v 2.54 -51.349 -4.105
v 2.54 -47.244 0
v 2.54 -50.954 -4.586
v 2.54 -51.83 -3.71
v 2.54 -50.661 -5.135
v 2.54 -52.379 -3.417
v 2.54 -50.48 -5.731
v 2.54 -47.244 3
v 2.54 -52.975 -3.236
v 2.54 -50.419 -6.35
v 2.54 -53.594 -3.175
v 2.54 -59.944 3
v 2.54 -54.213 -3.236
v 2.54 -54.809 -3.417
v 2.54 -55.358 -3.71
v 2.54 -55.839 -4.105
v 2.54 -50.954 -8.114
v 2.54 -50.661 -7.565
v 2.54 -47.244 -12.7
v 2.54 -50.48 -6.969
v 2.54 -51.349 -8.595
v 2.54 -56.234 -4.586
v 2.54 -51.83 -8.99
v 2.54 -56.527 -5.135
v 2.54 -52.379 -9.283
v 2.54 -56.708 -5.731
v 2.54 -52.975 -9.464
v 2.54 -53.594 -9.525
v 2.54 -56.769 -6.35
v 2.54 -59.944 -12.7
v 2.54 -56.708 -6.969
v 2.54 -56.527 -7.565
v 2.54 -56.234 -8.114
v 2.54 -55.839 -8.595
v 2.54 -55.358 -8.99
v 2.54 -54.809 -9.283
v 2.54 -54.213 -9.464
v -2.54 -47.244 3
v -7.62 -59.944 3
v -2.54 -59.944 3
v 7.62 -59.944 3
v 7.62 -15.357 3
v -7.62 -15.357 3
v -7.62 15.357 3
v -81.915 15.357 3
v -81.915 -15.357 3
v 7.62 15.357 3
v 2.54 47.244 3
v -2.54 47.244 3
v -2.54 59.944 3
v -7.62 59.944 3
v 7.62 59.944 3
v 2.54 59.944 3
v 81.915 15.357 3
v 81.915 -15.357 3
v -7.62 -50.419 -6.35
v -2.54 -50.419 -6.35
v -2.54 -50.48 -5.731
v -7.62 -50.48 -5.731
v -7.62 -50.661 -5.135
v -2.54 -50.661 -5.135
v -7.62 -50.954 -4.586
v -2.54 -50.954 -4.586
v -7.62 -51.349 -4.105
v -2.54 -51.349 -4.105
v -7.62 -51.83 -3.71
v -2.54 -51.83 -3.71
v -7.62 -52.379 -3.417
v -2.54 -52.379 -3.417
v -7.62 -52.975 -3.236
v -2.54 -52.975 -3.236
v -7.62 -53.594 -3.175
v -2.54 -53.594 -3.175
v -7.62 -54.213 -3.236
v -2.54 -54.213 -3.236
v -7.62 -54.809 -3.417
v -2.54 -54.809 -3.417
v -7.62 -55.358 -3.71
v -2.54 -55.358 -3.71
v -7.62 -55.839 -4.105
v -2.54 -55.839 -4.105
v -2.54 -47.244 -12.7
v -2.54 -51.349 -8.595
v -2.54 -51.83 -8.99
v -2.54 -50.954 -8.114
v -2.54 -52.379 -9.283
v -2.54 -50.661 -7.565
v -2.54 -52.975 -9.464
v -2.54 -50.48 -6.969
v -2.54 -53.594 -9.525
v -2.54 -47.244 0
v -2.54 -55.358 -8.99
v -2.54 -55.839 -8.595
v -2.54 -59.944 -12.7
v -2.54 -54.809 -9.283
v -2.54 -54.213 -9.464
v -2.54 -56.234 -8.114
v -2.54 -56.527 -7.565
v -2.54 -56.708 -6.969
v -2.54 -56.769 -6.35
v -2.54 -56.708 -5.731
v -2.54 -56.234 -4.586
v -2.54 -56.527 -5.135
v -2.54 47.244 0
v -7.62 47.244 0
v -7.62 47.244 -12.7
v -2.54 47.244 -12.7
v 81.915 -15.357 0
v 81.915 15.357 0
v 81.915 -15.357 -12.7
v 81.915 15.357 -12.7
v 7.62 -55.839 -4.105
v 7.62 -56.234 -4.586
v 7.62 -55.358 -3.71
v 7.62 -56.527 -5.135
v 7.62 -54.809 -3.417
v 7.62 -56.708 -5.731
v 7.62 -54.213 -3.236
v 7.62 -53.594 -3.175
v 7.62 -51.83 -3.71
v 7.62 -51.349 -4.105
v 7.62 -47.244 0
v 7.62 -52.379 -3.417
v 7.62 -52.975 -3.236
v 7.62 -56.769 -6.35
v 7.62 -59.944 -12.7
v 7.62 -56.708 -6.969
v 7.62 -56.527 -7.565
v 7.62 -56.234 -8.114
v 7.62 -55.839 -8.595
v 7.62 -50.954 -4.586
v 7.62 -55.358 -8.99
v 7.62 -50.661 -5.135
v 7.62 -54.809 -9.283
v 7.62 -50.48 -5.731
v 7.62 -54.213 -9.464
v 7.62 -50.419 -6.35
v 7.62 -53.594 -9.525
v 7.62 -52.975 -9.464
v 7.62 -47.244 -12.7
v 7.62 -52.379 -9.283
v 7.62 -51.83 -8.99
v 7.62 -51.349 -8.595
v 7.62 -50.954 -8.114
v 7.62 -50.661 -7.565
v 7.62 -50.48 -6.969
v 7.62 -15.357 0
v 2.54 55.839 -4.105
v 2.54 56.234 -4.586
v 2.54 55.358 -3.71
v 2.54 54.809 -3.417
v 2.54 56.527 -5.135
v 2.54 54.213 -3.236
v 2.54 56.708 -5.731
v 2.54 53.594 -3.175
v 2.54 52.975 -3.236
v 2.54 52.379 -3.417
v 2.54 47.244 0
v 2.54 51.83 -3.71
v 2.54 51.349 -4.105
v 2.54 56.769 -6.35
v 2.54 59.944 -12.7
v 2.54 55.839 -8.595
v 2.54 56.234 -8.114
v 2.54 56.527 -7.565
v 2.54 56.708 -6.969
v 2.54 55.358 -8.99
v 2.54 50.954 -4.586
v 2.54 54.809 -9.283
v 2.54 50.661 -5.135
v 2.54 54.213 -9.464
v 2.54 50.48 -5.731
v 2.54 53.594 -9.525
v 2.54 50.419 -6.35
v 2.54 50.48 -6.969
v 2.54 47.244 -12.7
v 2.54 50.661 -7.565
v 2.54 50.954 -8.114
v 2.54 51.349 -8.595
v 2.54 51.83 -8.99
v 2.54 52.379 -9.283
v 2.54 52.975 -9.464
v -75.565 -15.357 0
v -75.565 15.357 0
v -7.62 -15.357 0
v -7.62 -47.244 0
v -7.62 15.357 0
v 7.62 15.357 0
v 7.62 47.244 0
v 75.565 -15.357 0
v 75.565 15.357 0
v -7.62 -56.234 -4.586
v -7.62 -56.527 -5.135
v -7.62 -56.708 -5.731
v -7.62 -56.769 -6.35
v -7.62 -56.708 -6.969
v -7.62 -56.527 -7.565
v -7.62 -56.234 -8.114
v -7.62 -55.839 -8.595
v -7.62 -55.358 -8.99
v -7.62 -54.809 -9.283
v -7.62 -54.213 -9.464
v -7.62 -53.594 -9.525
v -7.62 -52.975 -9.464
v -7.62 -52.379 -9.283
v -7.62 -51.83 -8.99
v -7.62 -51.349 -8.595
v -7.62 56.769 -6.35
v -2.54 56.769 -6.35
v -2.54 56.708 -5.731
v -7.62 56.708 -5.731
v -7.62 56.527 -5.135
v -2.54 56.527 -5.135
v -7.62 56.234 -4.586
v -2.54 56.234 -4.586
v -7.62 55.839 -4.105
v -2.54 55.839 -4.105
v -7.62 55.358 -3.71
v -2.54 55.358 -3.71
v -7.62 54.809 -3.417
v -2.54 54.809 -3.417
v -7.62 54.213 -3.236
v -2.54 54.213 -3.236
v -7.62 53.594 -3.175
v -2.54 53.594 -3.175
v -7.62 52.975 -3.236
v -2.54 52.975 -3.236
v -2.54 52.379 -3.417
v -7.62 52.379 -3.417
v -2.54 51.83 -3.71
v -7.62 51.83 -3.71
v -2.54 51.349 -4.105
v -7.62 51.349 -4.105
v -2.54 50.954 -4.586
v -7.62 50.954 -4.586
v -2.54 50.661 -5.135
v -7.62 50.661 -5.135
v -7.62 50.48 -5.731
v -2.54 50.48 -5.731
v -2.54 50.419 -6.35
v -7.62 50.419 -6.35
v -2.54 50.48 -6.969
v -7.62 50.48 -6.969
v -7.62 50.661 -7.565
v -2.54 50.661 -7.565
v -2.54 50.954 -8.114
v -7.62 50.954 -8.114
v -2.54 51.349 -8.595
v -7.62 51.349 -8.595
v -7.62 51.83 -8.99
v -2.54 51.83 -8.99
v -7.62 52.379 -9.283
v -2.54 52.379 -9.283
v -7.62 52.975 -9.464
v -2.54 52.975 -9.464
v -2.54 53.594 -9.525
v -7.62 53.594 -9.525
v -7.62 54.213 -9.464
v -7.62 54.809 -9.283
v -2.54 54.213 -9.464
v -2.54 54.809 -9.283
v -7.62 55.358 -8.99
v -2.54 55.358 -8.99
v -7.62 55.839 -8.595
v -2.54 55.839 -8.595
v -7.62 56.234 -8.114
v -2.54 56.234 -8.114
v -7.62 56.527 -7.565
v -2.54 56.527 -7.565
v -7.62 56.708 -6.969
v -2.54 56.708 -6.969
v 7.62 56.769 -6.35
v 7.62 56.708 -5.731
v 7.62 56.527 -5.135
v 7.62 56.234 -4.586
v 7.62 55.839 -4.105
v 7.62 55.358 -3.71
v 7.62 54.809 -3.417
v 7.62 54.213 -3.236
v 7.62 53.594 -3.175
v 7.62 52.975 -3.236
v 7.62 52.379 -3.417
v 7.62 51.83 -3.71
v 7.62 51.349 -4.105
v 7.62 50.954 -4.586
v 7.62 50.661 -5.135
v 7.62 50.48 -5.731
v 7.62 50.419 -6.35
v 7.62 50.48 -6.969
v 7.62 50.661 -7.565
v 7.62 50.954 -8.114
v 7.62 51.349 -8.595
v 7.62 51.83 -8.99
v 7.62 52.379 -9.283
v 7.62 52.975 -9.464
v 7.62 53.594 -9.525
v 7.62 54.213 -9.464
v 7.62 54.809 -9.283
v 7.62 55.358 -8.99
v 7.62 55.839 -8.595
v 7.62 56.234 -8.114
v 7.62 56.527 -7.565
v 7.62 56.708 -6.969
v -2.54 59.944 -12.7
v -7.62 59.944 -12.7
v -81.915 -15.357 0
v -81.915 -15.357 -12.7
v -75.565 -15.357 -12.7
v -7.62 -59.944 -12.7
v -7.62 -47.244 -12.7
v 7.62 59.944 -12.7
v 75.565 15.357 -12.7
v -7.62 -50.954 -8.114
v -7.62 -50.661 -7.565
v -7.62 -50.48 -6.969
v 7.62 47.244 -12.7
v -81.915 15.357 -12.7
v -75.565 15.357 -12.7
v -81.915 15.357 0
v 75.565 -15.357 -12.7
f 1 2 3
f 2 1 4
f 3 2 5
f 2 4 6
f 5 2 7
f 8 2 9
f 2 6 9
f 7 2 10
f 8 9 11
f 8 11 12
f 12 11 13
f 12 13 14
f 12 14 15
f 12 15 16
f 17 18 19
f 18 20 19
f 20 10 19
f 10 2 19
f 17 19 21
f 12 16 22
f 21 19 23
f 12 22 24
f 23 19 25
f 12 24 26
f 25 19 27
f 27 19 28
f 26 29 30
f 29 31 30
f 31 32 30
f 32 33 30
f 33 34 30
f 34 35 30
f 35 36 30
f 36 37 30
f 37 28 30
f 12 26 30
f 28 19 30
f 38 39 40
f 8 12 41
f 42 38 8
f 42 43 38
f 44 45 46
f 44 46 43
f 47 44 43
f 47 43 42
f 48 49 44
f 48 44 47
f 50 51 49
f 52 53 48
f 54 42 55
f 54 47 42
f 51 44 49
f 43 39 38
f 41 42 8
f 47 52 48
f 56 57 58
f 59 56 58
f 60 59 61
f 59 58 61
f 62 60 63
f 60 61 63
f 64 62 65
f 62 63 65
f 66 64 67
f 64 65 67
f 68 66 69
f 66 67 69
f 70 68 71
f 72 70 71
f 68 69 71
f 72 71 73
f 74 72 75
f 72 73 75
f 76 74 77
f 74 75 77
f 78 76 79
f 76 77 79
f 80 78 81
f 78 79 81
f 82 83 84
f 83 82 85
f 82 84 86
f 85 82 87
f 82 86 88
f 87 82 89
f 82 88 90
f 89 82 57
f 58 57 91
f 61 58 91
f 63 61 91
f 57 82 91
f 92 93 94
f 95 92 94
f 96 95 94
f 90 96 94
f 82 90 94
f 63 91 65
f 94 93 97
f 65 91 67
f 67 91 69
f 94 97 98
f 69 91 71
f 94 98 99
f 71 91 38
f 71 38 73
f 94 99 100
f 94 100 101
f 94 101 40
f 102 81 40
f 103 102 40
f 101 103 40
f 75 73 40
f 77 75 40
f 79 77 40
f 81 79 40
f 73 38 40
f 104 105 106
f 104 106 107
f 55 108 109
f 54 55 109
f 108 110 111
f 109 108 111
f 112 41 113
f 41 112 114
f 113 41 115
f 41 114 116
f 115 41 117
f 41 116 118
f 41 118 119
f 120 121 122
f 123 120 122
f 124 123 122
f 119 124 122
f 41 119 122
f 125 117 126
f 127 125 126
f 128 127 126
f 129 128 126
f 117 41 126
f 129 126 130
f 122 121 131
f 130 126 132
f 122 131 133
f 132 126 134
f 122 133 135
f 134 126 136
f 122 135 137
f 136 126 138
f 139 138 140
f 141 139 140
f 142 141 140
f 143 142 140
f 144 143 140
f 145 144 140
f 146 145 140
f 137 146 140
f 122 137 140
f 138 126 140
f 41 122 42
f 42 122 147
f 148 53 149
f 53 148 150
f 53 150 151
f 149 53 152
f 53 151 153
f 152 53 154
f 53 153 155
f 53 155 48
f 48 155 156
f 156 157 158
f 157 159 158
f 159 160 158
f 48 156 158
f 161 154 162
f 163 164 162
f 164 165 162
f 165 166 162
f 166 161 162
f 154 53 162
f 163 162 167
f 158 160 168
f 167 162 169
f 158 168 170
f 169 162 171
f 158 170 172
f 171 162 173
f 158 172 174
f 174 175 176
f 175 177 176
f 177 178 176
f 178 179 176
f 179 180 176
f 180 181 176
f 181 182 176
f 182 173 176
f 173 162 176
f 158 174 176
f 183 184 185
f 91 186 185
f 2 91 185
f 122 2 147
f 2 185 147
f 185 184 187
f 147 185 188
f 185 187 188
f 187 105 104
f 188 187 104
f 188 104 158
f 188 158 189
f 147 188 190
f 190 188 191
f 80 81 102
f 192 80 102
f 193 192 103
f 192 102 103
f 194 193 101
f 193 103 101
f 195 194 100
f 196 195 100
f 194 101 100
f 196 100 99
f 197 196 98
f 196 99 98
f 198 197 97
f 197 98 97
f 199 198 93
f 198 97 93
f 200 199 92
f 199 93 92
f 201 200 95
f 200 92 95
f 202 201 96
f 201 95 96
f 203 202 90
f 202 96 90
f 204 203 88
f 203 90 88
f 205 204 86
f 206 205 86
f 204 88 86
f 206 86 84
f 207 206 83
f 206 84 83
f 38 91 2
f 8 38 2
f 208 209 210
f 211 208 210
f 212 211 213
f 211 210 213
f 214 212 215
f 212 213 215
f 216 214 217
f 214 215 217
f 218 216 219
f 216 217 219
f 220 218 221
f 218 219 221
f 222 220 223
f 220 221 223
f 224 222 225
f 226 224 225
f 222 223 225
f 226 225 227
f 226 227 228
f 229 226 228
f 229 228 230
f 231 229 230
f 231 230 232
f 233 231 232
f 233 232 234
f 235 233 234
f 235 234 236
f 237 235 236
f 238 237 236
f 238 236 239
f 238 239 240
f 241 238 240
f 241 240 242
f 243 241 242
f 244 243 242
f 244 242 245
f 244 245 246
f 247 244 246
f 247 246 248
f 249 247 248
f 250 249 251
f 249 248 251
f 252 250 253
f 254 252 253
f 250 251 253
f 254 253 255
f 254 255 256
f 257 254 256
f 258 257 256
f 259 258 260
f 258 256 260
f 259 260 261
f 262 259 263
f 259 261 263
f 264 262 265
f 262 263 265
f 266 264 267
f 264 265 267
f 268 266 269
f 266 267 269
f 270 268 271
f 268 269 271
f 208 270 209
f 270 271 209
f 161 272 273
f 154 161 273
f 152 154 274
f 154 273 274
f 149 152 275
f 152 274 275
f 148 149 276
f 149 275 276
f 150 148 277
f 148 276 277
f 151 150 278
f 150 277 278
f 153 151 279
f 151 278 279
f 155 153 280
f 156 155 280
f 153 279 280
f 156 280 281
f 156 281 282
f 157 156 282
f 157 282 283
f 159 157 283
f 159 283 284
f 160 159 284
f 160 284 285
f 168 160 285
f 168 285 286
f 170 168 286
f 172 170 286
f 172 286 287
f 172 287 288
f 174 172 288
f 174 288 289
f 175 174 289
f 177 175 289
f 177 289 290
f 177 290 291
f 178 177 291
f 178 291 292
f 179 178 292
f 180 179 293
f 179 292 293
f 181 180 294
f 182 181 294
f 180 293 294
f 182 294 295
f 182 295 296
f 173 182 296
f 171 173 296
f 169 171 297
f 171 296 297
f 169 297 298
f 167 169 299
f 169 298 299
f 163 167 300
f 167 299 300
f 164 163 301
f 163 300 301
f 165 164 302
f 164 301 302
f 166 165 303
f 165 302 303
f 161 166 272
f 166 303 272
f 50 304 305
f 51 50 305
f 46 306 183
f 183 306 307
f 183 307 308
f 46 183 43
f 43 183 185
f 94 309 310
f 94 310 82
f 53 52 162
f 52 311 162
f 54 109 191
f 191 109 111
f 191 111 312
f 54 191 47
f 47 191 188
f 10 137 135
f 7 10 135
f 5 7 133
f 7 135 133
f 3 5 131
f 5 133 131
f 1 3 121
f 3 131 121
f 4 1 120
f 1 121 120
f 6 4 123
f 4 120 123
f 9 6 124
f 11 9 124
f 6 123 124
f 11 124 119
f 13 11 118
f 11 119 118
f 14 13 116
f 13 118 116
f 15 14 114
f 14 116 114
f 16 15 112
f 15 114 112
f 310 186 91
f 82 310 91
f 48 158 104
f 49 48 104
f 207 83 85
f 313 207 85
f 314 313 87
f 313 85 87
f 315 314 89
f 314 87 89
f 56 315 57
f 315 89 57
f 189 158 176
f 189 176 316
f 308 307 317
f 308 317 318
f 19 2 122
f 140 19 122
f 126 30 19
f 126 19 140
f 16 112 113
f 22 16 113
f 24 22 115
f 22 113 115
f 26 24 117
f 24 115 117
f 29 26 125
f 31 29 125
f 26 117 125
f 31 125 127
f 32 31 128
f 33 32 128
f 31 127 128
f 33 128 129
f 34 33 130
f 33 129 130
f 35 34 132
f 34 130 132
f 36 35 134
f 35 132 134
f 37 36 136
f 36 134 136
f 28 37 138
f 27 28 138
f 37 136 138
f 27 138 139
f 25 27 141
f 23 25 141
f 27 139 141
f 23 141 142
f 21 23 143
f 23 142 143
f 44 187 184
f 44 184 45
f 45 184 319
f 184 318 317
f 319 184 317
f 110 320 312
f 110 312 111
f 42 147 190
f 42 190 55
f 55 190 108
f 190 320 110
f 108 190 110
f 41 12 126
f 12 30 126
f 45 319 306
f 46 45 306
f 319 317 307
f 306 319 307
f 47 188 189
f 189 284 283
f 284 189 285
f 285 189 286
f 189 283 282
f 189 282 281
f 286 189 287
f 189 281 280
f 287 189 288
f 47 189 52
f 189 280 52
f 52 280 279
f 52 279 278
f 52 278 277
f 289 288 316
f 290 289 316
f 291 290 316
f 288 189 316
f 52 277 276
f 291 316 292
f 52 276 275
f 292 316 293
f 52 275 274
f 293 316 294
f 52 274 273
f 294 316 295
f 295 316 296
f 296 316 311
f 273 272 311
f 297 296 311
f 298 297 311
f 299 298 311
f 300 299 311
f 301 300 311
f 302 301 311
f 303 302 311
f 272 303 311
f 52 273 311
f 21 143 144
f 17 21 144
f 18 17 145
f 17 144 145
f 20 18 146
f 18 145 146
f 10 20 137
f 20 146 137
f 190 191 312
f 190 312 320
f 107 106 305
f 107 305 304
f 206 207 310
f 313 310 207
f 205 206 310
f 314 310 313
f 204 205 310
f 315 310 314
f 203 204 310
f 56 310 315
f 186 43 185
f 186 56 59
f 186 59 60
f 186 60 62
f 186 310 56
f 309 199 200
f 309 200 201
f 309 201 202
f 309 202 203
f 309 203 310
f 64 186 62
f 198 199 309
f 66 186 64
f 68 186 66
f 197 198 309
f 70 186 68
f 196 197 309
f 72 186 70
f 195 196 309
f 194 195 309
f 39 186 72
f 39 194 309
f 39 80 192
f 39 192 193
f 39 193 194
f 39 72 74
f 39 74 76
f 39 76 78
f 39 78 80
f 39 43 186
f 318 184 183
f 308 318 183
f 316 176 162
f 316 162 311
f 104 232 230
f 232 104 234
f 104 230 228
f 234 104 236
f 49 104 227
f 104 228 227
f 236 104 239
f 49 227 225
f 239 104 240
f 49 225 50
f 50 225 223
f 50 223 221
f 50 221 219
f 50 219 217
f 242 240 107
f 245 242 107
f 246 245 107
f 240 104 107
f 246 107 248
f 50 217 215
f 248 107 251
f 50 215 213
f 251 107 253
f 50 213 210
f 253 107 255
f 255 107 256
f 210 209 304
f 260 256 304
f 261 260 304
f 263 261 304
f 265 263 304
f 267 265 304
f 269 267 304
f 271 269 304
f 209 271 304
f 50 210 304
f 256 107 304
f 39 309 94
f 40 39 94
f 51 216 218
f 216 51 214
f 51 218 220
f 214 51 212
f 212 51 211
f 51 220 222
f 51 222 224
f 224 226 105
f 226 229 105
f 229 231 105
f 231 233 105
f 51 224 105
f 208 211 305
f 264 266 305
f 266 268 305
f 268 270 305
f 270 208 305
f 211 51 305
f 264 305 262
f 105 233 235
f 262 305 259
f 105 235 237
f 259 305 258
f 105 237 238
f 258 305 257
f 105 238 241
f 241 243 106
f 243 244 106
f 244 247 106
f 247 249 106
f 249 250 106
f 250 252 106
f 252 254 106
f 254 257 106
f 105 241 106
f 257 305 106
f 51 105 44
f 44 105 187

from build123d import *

# Parameters (mm, degrees)
F1_DEPTH = 3
F2_W     = 5.08
F2_H     = 12.7
F2_W_2   = 6.35
F2_H_2   = 30.7130107253
F3_DEPTH = 12.7
F4_R     = 3.175
F5_DEPTH = 25.4


with BuildPart() as f1:
    # F0 (on Top) → F1 (new body)
    with BuildSketch(Plane.XY):
        Polygon((-2.54, 59.944), (-7.62, 59.944), (-7.62, 15.3565053627), (-81.915, 15.3565053627), (-81.915, -15.3565053627), (-7.62, -15.3565053627), (-7.62, -59.944), (-2.54, -59.944), (-2.54, -53.594), (-2.54, -47.244), (2.54, -47.244), (2.54, -59.944), (2.8766005316, -59.944), (6.35, -59.944), (7.62, -59.944), (7.62, -15.3565053627), (81.915, -15.3565053627), (81.915, 15.3565053627), (7.62, 15.3565053627), (7.62, 59.944), (6.35, 59.944), (2.8766005316, 59.944), (2.54, 59.944), (2.54, 47.244), (-2.54, 47.244), (-2.54, 53.594), align=None)
    extrude(amount=F1_DEPTH)

    # F2 (on face) → F3 (join)
    with BuildSketch(Plane(origin=(0, 0, 0), x_dir=(1, 0, 0), z_dir=(0, 0, -1))):
        with Locations((-5.08, 53.594)):
            Rectangle(F2_W, F2_H)
        with Locations((5.08, 53.594)):
            Rectangle(F2_W, F2_H)
        with Locations((78.74, 0)):
            Rectangle(F2_W_2, F2_H_2)
        with Locations((5.08, -53.594)):
            Rectangle(F2_W, F2_H)
        with Locations((-5.08, -53.594)):
            Rectangle(F2_W, F2_H)
        with Locations((-78.74, 0)):
            Rectangle(F2_W_2, F2_H_2)
    extrude(amount=F3_DEPTH)

    # F4 (on face) → F5 (cut)
    with BuildSketch(Plane.YZ.offset(7.62)):
        with Locations((53.594, -6.35)):
            Circle(F4_R)
        with BuildLine():
            Line((-55.8390640303, -4.1049359697), (-51.3489359697, -8.5950640303))
            ThreePointArc((-51.3489359697, -8.5950640303), (-50.6606824843, -7.5650198978), (-50.419, -6.35))
            ThreePointArc((-50.419, -6.35), (-52.3789801022, -3.4166824843), (-55.8390640303, -4.1049359697))
        make_face()
        with BuildLine():
            ThreePointArc((-55.8390640303, -4.1049359697), (-55.8390640303, -8.5950640303), (-51.3489359697, -8.5950640303))
            Line((-51.3489359697, -8.5950640303), (-55.8390640303, -4.1049359697))
        make_face()
    extrude(amount=-F5_DEPTH, mode=Mode.SUBTRACT)


solid = f1.part
